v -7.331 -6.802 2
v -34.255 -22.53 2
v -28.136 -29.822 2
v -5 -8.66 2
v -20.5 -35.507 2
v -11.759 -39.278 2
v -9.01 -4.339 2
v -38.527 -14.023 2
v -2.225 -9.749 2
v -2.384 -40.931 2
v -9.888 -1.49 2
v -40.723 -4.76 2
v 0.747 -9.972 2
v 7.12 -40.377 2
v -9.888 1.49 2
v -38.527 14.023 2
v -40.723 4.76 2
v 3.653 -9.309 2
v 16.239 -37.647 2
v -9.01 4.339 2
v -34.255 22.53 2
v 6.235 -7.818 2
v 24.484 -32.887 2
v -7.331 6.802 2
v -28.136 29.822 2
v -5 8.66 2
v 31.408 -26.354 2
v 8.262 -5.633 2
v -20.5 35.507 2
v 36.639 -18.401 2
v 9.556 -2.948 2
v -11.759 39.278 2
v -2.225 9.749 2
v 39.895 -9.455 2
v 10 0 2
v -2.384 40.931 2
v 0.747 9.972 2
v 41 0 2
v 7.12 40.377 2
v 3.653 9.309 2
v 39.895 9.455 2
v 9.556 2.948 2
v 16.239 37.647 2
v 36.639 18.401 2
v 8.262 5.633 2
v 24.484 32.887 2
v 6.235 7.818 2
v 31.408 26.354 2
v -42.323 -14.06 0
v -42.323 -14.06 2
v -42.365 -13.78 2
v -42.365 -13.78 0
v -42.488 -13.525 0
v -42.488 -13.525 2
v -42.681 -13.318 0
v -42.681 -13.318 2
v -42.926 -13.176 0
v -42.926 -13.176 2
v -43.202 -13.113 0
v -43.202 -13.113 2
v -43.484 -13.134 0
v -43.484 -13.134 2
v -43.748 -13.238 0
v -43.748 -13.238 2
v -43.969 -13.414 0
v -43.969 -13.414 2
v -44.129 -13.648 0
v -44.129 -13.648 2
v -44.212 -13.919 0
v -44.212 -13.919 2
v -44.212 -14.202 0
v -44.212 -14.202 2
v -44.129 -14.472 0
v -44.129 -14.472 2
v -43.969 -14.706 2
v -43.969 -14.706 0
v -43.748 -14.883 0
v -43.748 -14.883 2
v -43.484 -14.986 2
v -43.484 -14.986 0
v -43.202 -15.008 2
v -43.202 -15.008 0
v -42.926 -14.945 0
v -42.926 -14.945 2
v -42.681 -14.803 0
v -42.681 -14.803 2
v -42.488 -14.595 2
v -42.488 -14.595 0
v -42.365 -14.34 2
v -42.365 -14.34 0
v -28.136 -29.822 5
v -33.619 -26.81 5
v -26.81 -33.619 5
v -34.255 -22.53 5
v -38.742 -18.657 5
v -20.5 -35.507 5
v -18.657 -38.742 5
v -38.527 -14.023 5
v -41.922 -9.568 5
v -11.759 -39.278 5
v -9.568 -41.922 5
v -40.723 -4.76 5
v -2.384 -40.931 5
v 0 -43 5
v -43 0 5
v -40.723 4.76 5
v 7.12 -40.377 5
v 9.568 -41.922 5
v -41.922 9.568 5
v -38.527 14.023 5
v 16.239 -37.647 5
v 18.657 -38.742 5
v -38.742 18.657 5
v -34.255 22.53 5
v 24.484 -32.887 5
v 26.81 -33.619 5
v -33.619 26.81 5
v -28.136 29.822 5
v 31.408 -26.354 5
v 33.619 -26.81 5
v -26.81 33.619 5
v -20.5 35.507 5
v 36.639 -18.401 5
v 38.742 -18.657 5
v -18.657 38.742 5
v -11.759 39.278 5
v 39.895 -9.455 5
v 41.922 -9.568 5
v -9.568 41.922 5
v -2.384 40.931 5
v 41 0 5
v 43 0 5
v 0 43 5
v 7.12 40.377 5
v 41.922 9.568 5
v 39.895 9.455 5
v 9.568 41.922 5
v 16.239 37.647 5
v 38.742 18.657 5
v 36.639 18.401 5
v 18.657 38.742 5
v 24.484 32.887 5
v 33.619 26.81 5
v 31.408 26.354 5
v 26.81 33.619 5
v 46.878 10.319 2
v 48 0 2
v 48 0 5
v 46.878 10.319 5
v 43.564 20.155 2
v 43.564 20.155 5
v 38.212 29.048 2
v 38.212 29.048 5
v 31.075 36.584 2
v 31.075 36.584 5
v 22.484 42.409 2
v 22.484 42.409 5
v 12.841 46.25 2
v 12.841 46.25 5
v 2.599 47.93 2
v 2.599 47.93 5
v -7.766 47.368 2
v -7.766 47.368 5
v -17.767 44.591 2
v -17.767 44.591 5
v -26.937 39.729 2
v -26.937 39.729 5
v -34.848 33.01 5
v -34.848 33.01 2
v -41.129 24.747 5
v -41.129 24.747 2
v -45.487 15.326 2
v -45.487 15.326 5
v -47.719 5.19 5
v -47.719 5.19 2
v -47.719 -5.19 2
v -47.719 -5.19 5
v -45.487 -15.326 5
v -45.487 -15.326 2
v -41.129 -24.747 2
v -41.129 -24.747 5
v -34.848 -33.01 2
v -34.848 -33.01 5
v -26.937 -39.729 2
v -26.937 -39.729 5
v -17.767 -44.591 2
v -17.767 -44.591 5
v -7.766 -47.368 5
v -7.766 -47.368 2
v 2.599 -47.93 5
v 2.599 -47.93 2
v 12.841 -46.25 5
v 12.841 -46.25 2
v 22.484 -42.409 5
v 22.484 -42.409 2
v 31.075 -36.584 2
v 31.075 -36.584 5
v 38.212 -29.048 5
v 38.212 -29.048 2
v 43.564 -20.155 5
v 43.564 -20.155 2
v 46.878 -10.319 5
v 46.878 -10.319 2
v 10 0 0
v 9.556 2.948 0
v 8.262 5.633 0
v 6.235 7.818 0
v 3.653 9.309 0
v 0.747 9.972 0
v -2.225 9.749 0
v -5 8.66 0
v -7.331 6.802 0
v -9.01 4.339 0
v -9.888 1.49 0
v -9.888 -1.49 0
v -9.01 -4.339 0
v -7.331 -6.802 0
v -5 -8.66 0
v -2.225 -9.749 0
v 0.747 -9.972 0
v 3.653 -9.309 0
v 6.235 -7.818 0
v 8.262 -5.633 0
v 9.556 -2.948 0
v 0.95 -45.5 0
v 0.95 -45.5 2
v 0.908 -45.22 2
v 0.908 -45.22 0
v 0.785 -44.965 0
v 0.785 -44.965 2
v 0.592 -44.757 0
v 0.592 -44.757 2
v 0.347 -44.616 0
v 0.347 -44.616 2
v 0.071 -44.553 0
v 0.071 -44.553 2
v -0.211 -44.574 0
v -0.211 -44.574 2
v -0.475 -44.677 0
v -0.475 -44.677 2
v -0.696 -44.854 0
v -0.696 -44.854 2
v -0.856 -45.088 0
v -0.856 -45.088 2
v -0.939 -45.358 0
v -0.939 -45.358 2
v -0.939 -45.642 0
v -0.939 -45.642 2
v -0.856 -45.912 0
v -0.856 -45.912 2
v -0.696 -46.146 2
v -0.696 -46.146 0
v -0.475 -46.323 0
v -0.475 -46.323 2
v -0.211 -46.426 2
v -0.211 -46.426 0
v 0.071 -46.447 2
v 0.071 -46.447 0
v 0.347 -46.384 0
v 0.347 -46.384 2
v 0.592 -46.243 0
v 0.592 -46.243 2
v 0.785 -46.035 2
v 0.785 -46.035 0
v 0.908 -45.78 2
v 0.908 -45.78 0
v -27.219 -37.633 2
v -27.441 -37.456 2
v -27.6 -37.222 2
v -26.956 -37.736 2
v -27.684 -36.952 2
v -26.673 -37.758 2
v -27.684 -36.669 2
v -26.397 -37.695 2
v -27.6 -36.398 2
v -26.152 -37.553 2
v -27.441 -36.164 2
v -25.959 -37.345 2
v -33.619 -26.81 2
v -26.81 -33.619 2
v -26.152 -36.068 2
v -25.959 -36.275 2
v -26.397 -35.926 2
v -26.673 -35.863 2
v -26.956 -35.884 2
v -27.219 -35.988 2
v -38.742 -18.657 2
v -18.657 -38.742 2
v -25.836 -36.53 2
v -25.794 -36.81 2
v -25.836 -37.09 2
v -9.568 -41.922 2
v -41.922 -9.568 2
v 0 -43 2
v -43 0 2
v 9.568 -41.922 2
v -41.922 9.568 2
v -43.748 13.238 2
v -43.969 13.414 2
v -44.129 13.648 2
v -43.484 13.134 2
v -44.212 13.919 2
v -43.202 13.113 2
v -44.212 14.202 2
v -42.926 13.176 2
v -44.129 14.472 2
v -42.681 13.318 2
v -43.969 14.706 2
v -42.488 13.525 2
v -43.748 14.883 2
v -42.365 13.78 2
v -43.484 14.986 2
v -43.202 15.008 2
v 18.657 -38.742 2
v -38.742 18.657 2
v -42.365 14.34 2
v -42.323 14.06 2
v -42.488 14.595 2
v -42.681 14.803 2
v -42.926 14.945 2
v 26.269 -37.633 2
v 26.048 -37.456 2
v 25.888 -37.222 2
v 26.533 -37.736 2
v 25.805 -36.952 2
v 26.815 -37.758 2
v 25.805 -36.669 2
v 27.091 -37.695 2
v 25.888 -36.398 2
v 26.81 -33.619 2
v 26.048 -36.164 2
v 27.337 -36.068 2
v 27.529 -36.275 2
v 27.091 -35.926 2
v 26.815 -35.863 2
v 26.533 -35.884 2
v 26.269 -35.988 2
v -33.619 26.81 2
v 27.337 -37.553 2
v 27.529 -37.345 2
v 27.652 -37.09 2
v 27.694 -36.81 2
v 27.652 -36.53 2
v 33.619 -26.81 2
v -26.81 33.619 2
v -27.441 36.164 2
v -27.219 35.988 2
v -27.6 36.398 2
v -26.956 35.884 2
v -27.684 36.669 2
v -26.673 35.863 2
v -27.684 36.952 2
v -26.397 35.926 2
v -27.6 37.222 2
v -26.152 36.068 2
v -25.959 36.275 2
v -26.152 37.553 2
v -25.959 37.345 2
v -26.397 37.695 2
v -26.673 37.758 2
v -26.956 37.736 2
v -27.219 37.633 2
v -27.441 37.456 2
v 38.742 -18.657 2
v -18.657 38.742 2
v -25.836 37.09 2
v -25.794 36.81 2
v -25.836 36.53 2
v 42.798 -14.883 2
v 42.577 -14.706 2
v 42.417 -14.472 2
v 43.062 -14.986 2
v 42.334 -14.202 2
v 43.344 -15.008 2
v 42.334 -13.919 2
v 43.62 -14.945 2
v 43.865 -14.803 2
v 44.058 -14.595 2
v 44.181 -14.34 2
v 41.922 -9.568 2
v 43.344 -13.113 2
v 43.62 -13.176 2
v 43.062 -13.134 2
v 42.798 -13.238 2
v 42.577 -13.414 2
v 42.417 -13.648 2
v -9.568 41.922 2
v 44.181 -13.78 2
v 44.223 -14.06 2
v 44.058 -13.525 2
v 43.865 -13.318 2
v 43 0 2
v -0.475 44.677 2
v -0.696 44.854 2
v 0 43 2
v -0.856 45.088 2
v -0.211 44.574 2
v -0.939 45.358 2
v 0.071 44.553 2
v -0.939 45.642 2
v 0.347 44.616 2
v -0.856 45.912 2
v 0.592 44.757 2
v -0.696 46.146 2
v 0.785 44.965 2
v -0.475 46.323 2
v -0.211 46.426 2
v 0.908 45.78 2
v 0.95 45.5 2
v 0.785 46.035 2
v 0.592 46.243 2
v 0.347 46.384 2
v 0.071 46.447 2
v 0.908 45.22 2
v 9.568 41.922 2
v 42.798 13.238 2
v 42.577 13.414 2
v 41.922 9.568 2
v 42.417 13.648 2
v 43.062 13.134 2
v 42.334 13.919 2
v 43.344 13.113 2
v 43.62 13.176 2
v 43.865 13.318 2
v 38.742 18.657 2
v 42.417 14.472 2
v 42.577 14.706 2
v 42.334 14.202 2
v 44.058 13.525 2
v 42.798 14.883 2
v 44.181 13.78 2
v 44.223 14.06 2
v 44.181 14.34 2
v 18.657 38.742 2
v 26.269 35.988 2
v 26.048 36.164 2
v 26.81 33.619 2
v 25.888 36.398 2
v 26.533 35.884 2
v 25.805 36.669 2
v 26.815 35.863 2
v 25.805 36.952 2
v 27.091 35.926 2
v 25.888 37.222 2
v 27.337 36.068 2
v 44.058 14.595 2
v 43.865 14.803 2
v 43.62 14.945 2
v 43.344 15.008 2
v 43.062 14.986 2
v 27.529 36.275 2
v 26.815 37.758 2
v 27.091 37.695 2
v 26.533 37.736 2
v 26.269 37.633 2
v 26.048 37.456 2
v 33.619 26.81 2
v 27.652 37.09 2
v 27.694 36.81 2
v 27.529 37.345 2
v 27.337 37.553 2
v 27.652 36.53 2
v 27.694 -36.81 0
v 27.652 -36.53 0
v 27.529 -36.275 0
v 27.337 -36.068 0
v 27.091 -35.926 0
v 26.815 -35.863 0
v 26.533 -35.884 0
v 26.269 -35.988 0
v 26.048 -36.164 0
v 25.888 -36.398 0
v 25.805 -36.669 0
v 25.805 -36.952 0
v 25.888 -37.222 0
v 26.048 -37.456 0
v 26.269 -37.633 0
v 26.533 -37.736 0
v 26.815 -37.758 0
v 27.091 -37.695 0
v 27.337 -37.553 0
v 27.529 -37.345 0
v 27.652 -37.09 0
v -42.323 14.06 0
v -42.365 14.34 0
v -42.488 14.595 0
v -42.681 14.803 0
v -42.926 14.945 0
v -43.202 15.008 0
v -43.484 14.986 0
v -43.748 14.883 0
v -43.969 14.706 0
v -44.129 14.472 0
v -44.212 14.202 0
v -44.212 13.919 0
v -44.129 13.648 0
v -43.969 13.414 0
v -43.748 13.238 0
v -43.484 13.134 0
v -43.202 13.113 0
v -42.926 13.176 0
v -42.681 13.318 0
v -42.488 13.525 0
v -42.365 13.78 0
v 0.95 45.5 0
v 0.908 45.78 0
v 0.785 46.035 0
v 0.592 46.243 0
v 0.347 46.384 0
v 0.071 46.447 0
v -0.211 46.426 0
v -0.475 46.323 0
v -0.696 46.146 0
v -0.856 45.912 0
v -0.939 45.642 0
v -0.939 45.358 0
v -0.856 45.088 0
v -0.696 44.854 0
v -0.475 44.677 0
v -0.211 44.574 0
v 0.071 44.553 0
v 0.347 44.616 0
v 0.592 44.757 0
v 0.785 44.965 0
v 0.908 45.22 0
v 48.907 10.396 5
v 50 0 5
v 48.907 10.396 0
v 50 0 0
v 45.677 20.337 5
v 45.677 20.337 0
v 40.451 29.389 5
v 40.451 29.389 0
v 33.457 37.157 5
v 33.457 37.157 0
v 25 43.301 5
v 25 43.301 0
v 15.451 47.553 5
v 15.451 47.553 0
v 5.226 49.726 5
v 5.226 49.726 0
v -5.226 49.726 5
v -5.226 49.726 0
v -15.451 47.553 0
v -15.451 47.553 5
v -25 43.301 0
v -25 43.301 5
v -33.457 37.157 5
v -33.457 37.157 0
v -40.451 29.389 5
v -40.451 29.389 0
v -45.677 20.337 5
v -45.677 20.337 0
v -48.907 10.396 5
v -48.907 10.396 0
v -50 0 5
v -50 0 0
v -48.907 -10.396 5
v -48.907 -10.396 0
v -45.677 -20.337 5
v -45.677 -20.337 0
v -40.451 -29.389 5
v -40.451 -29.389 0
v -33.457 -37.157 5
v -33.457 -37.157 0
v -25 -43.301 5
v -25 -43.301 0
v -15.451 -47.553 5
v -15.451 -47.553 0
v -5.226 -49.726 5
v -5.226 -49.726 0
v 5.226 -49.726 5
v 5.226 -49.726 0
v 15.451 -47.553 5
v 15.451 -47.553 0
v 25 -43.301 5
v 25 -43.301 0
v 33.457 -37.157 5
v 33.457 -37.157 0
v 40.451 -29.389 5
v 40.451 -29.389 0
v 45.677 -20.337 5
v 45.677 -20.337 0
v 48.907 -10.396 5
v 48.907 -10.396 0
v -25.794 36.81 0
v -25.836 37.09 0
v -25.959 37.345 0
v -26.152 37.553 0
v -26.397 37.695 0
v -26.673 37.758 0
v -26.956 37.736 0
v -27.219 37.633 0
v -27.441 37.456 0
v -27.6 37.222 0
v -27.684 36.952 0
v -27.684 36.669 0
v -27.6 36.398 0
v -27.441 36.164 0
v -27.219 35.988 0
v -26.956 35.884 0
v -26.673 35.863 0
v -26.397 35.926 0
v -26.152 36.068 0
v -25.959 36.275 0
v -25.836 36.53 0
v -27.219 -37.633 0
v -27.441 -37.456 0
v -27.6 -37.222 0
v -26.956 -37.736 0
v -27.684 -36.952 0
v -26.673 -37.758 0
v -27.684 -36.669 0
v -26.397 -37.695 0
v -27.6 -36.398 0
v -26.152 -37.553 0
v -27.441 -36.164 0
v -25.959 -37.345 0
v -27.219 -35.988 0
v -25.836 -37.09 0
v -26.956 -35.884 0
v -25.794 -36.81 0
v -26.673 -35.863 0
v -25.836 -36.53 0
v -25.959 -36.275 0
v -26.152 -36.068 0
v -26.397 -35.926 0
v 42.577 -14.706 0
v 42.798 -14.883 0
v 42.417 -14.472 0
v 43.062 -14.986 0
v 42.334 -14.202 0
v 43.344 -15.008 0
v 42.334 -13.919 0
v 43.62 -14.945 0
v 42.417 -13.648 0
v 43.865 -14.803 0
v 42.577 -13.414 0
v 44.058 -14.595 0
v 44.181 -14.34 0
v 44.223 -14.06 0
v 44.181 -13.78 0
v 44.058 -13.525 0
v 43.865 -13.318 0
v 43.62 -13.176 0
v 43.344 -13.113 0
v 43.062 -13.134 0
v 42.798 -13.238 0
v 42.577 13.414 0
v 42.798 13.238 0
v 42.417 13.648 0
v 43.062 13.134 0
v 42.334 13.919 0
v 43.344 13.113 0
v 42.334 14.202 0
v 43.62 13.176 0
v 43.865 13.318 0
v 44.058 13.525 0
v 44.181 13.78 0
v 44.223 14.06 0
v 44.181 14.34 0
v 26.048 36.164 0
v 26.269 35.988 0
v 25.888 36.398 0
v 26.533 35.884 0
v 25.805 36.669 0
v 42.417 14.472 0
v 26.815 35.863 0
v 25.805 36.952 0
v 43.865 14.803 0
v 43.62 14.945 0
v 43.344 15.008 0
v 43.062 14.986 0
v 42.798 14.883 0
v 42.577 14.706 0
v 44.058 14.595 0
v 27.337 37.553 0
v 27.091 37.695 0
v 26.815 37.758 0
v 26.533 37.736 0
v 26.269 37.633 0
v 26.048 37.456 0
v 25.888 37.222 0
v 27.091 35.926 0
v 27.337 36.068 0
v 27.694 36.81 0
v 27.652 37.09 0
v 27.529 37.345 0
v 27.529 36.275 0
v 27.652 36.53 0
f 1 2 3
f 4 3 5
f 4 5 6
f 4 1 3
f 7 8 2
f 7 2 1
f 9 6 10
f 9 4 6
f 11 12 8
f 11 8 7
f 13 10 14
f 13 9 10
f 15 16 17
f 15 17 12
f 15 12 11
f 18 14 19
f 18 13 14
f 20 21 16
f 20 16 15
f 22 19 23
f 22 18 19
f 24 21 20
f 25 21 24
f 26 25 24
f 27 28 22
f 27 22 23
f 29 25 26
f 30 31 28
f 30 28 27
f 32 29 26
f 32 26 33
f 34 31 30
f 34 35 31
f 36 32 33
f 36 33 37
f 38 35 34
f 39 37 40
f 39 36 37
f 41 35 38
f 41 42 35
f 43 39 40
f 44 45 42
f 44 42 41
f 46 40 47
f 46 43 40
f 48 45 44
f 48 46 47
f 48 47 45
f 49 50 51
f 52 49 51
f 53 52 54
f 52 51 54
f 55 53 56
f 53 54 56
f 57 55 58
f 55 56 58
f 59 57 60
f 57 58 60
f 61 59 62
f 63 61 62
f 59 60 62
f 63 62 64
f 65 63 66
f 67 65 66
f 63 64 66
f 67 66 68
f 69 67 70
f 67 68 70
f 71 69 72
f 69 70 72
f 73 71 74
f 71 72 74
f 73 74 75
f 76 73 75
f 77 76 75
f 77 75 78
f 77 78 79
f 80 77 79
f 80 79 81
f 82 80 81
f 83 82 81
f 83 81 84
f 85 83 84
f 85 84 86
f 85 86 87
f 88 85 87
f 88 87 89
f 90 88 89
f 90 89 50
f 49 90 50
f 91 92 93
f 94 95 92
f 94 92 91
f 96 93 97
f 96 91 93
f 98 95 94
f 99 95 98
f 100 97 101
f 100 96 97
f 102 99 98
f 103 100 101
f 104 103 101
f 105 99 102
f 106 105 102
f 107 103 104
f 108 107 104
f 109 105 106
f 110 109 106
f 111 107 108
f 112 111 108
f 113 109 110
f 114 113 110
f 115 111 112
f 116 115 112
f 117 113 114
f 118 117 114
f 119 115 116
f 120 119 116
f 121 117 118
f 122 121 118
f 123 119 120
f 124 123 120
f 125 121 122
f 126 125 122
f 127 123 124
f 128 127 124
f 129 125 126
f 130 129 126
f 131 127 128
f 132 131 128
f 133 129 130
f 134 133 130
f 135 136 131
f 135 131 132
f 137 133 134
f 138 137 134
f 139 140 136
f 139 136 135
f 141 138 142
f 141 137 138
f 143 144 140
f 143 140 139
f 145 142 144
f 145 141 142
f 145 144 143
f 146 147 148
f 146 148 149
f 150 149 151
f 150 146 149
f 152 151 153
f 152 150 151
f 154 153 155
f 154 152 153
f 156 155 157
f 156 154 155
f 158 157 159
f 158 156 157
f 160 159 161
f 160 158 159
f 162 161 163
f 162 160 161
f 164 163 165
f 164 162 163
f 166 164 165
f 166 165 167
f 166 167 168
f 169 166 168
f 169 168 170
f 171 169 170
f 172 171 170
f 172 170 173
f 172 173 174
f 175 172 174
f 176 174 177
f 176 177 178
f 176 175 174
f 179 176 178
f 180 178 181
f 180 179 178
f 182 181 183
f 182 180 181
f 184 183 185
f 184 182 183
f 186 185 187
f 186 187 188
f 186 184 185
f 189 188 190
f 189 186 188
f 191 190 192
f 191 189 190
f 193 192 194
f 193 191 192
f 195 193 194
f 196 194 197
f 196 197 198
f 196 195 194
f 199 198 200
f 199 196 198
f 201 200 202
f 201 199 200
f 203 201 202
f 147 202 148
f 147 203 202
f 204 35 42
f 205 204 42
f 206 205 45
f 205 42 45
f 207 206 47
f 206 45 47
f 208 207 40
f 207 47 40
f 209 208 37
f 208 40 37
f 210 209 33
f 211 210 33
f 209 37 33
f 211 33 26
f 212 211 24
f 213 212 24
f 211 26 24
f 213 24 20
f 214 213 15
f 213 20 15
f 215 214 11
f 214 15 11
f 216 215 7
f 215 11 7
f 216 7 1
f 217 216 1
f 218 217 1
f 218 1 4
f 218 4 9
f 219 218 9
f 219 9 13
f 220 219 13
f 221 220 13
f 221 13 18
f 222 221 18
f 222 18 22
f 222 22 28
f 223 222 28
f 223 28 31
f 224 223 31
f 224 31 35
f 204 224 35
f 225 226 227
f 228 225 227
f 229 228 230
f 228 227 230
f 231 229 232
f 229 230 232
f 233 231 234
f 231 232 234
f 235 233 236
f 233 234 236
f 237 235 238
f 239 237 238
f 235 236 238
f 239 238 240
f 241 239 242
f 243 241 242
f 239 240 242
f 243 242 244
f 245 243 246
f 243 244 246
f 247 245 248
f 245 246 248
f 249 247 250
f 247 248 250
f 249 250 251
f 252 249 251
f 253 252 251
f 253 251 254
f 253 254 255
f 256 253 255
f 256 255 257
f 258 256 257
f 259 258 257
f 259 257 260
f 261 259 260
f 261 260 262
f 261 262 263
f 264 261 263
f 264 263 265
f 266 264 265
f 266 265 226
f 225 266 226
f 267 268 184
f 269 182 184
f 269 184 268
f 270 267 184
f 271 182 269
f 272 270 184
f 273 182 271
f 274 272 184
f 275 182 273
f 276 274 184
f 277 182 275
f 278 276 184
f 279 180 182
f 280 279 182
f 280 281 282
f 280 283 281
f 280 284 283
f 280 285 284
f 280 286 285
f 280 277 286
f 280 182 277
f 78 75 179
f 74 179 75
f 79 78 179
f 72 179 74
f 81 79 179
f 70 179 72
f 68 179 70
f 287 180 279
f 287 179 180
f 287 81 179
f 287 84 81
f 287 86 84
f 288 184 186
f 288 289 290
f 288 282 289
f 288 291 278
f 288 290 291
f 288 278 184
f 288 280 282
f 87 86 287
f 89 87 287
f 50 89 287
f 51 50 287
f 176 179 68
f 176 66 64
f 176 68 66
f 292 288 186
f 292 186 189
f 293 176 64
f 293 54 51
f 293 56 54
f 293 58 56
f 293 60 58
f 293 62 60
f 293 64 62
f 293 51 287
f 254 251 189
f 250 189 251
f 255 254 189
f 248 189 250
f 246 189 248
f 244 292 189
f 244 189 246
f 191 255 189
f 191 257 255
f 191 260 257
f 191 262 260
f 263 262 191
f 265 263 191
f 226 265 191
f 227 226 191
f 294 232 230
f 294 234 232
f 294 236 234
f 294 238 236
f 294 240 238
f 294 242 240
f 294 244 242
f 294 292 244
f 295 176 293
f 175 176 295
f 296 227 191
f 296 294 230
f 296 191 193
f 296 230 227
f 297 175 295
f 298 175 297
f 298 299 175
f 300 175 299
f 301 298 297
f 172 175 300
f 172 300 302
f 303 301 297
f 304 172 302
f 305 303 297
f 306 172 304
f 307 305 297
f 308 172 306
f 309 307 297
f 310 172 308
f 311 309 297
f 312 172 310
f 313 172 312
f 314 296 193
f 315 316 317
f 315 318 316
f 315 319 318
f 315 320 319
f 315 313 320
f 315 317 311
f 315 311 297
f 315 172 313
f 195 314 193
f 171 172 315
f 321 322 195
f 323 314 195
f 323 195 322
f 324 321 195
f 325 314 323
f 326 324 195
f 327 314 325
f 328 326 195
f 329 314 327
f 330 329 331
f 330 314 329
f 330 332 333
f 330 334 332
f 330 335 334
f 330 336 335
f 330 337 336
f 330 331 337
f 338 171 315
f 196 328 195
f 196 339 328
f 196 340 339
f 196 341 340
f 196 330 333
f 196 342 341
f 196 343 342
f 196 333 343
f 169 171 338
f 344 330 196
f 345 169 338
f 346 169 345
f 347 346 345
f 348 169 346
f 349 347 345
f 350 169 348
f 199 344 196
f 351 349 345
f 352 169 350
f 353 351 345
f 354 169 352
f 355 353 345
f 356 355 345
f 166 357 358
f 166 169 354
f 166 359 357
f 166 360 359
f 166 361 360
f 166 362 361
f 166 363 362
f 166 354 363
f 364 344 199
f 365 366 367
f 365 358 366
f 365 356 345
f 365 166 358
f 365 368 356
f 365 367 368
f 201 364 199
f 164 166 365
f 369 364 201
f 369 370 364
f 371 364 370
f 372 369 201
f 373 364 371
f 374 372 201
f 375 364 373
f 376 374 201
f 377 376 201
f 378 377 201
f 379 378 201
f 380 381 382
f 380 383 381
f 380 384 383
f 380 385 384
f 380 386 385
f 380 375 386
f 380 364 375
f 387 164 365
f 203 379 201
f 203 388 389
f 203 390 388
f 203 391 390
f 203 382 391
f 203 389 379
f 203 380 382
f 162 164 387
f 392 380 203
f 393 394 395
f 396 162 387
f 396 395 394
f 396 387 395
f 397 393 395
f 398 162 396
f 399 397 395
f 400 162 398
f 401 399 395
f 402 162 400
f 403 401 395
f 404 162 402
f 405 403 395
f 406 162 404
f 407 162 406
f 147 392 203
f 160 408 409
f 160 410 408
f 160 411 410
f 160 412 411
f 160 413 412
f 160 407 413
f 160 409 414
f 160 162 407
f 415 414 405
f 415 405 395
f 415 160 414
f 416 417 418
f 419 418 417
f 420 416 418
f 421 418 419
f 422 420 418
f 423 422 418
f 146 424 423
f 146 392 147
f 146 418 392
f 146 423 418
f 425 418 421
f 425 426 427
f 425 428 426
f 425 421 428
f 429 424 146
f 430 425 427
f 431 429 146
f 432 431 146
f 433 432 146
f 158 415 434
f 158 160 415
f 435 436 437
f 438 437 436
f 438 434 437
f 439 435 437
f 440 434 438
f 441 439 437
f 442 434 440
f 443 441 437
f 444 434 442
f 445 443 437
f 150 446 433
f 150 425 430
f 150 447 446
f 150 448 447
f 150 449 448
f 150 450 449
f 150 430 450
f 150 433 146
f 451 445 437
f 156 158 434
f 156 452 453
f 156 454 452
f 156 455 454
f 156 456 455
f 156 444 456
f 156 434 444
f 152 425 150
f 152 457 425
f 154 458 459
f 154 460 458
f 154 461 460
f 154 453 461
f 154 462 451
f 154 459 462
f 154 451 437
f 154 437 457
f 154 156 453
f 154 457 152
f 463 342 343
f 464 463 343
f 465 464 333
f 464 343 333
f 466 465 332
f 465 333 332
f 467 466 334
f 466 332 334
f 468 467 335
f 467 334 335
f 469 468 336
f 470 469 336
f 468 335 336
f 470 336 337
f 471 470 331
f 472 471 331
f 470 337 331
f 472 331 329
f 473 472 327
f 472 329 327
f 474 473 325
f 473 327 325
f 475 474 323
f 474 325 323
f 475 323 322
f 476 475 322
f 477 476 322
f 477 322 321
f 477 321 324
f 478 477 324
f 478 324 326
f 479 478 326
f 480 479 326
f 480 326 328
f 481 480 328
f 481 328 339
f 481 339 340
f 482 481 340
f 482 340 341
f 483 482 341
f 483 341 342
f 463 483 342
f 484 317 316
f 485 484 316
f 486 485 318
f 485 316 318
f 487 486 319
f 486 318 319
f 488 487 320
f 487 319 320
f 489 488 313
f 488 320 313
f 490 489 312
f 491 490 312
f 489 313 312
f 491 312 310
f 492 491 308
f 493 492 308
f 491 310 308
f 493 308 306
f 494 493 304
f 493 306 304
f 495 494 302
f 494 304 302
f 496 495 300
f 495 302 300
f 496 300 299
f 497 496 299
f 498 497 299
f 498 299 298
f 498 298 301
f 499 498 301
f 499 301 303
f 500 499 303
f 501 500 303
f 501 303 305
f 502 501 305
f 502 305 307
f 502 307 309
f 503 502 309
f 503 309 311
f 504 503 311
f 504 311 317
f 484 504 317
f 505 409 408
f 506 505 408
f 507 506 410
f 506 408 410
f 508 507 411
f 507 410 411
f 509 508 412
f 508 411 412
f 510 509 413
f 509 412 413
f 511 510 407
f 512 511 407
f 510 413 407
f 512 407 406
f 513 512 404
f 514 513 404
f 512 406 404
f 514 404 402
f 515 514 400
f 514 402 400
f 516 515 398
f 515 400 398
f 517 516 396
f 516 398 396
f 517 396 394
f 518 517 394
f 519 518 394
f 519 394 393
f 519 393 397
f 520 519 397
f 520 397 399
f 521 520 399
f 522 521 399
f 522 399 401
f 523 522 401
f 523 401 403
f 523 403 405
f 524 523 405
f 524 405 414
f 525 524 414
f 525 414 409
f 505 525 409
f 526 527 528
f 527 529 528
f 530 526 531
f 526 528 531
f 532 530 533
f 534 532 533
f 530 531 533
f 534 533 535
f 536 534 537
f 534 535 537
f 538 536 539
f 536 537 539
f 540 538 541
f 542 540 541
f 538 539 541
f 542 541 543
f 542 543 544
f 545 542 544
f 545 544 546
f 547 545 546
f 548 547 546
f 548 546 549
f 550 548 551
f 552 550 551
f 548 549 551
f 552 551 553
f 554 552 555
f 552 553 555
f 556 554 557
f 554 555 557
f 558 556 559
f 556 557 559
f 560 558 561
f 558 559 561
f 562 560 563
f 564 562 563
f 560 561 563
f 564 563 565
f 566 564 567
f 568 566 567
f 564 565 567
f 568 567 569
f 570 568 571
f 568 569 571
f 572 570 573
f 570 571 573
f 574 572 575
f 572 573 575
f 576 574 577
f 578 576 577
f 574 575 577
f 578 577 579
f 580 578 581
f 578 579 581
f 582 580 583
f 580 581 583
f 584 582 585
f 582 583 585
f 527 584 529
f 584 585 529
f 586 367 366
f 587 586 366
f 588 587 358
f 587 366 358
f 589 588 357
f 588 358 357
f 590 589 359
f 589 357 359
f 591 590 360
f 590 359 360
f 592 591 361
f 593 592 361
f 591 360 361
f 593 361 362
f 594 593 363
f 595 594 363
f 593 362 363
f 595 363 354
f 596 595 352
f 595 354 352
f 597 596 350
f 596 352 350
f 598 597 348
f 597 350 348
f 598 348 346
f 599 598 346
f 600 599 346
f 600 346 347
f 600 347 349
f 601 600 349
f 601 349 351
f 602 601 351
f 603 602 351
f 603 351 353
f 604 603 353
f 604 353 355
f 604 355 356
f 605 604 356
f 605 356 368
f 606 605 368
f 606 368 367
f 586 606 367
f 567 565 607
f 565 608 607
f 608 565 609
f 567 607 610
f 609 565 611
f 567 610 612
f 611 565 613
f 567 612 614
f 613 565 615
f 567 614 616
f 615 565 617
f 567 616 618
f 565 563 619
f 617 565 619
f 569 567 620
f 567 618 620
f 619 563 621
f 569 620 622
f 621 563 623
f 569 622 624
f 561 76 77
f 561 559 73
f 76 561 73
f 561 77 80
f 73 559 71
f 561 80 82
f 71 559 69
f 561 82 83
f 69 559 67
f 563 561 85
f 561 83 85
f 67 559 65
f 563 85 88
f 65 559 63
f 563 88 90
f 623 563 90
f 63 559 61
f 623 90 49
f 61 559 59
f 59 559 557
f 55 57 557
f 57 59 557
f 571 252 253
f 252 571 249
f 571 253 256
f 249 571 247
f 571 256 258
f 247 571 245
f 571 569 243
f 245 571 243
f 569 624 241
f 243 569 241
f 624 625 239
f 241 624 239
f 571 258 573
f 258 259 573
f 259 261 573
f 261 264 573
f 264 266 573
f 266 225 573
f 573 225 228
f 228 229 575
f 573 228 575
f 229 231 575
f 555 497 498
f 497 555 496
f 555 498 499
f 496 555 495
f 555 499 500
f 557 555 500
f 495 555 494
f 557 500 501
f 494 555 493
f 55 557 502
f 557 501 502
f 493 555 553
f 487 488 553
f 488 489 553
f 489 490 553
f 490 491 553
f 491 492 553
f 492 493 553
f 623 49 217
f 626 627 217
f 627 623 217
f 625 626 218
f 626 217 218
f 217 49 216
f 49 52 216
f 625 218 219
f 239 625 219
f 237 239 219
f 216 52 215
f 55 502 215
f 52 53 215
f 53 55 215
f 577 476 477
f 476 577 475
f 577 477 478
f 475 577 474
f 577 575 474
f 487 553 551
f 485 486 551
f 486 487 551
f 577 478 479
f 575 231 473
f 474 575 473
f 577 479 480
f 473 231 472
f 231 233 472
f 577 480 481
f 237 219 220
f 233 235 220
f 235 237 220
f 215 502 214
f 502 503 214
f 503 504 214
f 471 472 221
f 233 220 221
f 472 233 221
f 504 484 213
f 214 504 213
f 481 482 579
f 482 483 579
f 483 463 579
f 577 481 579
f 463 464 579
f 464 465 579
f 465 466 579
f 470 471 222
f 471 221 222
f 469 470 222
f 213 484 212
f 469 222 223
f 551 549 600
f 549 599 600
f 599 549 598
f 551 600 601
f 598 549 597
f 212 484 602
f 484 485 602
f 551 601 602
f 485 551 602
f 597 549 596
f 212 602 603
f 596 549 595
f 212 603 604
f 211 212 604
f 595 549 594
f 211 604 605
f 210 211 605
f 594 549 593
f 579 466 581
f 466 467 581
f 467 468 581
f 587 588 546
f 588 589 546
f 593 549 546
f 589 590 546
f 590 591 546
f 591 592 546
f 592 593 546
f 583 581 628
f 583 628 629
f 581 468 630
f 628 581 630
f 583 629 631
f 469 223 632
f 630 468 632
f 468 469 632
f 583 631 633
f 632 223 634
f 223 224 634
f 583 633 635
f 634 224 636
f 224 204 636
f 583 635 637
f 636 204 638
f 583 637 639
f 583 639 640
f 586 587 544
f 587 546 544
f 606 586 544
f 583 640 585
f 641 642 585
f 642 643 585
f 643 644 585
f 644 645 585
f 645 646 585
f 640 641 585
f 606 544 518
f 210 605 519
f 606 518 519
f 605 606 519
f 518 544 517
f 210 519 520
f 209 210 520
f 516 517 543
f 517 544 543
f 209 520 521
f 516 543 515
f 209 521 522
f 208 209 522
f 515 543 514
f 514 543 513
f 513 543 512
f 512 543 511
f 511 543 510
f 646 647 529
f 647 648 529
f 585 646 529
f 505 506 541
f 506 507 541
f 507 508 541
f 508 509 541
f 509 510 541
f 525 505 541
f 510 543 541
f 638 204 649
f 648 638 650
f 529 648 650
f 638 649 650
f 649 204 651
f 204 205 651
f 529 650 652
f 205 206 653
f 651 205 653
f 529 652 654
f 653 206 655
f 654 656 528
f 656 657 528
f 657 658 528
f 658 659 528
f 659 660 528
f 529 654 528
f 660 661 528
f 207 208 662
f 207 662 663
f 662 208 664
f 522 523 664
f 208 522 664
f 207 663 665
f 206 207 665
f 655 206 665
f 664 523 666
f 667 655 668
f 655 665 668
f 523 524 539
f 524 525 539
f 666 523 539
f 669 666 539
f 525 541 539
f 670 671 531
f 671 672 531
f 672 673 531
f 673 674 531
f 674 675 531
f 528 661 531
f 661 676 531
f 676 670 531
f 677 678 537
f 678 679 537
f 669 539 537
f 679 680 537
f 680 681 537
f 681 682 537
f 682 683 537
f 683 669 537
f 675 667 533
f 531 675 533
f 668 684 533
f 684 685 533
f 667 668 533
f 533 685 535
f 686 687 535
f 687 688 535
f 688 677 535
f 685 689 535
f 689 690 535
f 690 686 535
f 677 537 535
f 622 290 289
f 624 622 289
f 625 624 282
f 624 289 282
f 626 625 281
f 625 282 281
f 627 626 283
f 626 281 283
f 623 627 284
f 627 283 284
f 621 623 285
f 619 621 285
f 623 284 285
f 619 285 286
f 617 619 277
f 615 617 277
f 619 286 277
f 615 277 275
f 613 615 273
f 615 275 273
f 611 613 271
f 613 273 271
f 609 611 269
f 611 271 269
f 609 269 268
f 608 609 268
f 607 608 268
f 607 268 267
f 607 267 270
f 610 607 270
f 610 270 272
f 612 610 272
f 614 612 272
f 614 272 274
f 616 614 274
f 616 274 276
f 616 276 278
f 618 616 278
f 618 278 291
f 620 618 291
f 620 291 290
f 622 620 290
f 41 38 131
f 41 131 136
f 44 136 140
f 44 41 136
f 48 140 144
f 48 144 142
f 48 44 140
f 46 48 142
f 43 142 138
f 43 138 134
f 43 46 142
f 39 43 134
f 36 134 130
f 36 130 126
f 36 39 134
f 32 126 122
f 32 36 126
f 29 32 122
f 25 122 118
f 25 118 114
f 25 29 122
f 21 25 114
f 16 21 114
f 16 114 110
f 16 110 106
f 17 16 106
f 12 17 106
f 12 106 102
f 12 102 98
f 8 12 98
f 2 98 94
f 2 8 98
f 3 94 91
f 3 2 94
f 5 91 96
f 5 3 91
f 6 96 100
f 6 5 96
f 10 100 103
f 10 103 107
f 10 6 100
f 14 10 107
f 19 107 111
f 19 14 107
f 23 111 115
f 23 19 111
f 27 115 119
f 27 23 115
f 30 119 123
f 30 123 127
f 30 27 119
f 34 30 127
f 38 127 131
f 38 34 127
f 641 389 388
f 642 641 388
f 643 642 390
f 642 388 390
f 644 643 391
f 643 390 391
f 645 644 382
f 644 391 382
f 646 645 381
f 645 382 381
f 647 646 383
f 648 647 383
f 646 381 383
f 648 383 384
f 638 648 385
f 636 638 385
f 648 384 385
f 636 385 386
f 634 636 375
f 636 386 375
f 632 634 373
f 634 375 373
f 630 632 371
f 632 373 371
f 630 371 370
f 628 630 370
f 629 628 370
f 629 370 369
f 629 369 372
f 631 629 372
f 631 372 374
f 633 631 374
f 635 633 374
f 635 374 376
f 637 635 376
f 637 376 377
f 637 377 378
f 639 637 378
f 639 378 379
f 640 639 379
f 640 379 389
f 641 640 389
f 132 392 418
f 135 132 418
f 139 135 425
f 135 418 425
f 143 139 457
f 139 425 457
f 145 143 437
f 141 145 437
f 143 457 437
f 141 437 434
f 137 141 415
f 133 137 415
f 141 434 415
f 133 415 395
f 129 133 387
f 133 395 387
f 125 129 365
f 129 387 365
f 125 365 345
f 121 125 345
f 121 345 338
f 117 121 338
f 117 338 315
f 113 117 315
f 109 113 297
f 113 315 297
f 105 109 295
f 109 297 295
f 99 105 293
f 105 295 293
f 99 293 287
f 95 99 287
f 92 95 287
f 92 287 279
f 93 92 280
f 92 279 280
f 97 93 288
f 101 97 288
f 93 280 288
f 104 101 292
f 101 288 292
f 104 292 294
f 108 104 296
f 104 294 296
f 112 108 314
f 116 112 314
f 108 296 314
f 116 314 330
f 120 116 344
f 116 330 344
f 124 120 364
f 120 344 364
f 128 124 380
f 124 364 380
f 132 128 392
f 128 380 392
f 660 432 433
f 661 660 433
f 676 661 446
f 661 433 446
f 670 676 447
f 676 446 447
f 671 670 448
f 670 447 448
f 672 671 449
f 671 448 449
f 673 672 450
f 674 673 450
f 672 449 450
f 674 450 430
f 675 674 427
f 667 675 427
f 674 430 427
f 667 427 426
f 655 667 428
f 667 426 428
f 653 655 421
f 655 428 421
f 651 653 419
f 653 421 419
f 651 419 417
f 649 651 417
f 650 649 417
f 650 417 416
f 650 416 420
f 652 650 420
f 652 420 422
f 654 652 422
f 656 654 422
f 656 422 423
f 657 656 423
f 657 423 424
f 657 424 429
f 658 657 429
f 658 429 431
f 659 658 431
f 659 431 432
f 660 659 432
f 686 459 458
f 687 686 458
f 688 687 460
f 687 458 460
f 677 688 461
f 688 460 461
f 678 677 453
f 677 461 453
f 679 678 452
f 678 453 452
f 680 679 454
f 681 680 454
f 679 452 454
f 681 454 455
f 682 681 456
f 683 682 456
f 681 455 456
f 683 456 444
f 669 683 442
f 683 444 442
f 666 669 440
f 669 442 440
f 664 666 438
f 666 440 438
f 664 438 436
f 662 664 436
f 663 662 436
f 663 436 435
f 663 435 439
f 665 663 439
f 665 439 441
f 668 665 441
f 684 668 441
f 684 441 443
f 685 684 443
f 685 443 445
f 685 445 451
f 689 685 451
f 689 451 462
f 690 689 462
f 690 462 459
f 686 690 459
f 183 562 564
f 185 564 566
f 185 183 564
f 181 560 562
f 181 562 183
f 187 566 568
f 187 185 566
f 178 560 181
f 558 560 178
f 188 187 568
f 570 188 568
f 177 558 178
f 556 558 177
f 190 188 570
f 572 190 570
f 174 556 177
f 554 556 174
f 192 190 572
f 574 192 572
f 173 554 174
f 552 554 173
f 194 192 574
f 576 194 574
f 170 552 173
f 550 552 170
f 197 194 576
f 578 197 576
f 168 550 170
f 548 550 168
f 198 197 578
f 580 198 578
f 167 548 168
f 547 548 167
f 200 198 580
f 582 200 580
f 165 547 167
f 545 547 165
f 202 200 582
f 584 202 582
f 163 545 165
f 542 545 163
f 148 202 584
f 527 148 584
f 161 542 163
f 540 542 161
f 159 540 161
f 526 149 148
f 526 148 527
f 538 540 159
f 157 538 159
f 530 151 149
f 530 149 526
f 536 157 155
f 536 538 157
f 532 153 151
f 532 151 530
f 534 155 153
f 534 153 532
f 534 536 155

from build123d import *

# Parameters (mm, degrees)
F0_R     = 50
F1_DEPTH = 2
F2_R     = 50
F2_R_2   = 48
F2_R_3   = 43
F2_R_4   = 41
F3_DEPTH = 3
F4_R     = 0.95
F5_DEPTH = 2.001
F6_R     = 10
F7_DEPTH = 2.001


with BuildPart() as f1:
    # F0 (on Top) → F1 (new body)
    with BuildSketch(Plane.XY):
        Circle(F0_R)
    extrude(amount=F1_DEPTH)

    # F2 (on face) → F3 (join)
    with BuildSketch(Plane.XY.offset(2)):
        Circle(F2_R)
        Circle(F2_R_2, mode=Mode.SUBTRACT)
        Circle(F2_R_3)
        Circle(F2_R_4, mode=Mode.SUBTRACT)
    extrude(amount=F3_DEPTH)

    # F4 (on face) → F5 (cut, through all)
    with BuildSketch(Plane.XY.offset(2)):
        with Locations((0, 45.5)):
            Circle(F4_R)
        with Locations((-26.7442289793, 36.8102732441)):
            Circle(F4_R)
        with Locations((-43.2730714914, 14.0602732441)):
            Circle(F4_R)
        with Locations((-43.2730714914, -14.0602732441)):
            Circle(F4_R)
        with Locations((-26.7442289793, -36.8102732441)):
            Circle(F4_R)
        with Locations((0, -45.5)):
            Circle(F4_R)
        with Locations((26.7442289793, -36.8102732441)):
            Circle(F4_R)
        with Locations((43.2730714914, -14.0602732441)):
            Circle(F4_R)
        with Locations((43.2730714914, 14.0602732441)):
            Circle(F4_R)
        with Locations((26.7442289793, 36.8102732441)):
            Circle(F4_R)
    extrude(amount=-F5_DEPTH, mode=Mode.SUBTRACT)

    # F6 (on face) → F7 (cut, through all)
    with BuildSketch(Plane.XY.offset(2)):
        Circle(F6_R)
    extrude(amount=-F7_DEPTH, mode=Mode.SUBTRACT)


solid = f1.part
